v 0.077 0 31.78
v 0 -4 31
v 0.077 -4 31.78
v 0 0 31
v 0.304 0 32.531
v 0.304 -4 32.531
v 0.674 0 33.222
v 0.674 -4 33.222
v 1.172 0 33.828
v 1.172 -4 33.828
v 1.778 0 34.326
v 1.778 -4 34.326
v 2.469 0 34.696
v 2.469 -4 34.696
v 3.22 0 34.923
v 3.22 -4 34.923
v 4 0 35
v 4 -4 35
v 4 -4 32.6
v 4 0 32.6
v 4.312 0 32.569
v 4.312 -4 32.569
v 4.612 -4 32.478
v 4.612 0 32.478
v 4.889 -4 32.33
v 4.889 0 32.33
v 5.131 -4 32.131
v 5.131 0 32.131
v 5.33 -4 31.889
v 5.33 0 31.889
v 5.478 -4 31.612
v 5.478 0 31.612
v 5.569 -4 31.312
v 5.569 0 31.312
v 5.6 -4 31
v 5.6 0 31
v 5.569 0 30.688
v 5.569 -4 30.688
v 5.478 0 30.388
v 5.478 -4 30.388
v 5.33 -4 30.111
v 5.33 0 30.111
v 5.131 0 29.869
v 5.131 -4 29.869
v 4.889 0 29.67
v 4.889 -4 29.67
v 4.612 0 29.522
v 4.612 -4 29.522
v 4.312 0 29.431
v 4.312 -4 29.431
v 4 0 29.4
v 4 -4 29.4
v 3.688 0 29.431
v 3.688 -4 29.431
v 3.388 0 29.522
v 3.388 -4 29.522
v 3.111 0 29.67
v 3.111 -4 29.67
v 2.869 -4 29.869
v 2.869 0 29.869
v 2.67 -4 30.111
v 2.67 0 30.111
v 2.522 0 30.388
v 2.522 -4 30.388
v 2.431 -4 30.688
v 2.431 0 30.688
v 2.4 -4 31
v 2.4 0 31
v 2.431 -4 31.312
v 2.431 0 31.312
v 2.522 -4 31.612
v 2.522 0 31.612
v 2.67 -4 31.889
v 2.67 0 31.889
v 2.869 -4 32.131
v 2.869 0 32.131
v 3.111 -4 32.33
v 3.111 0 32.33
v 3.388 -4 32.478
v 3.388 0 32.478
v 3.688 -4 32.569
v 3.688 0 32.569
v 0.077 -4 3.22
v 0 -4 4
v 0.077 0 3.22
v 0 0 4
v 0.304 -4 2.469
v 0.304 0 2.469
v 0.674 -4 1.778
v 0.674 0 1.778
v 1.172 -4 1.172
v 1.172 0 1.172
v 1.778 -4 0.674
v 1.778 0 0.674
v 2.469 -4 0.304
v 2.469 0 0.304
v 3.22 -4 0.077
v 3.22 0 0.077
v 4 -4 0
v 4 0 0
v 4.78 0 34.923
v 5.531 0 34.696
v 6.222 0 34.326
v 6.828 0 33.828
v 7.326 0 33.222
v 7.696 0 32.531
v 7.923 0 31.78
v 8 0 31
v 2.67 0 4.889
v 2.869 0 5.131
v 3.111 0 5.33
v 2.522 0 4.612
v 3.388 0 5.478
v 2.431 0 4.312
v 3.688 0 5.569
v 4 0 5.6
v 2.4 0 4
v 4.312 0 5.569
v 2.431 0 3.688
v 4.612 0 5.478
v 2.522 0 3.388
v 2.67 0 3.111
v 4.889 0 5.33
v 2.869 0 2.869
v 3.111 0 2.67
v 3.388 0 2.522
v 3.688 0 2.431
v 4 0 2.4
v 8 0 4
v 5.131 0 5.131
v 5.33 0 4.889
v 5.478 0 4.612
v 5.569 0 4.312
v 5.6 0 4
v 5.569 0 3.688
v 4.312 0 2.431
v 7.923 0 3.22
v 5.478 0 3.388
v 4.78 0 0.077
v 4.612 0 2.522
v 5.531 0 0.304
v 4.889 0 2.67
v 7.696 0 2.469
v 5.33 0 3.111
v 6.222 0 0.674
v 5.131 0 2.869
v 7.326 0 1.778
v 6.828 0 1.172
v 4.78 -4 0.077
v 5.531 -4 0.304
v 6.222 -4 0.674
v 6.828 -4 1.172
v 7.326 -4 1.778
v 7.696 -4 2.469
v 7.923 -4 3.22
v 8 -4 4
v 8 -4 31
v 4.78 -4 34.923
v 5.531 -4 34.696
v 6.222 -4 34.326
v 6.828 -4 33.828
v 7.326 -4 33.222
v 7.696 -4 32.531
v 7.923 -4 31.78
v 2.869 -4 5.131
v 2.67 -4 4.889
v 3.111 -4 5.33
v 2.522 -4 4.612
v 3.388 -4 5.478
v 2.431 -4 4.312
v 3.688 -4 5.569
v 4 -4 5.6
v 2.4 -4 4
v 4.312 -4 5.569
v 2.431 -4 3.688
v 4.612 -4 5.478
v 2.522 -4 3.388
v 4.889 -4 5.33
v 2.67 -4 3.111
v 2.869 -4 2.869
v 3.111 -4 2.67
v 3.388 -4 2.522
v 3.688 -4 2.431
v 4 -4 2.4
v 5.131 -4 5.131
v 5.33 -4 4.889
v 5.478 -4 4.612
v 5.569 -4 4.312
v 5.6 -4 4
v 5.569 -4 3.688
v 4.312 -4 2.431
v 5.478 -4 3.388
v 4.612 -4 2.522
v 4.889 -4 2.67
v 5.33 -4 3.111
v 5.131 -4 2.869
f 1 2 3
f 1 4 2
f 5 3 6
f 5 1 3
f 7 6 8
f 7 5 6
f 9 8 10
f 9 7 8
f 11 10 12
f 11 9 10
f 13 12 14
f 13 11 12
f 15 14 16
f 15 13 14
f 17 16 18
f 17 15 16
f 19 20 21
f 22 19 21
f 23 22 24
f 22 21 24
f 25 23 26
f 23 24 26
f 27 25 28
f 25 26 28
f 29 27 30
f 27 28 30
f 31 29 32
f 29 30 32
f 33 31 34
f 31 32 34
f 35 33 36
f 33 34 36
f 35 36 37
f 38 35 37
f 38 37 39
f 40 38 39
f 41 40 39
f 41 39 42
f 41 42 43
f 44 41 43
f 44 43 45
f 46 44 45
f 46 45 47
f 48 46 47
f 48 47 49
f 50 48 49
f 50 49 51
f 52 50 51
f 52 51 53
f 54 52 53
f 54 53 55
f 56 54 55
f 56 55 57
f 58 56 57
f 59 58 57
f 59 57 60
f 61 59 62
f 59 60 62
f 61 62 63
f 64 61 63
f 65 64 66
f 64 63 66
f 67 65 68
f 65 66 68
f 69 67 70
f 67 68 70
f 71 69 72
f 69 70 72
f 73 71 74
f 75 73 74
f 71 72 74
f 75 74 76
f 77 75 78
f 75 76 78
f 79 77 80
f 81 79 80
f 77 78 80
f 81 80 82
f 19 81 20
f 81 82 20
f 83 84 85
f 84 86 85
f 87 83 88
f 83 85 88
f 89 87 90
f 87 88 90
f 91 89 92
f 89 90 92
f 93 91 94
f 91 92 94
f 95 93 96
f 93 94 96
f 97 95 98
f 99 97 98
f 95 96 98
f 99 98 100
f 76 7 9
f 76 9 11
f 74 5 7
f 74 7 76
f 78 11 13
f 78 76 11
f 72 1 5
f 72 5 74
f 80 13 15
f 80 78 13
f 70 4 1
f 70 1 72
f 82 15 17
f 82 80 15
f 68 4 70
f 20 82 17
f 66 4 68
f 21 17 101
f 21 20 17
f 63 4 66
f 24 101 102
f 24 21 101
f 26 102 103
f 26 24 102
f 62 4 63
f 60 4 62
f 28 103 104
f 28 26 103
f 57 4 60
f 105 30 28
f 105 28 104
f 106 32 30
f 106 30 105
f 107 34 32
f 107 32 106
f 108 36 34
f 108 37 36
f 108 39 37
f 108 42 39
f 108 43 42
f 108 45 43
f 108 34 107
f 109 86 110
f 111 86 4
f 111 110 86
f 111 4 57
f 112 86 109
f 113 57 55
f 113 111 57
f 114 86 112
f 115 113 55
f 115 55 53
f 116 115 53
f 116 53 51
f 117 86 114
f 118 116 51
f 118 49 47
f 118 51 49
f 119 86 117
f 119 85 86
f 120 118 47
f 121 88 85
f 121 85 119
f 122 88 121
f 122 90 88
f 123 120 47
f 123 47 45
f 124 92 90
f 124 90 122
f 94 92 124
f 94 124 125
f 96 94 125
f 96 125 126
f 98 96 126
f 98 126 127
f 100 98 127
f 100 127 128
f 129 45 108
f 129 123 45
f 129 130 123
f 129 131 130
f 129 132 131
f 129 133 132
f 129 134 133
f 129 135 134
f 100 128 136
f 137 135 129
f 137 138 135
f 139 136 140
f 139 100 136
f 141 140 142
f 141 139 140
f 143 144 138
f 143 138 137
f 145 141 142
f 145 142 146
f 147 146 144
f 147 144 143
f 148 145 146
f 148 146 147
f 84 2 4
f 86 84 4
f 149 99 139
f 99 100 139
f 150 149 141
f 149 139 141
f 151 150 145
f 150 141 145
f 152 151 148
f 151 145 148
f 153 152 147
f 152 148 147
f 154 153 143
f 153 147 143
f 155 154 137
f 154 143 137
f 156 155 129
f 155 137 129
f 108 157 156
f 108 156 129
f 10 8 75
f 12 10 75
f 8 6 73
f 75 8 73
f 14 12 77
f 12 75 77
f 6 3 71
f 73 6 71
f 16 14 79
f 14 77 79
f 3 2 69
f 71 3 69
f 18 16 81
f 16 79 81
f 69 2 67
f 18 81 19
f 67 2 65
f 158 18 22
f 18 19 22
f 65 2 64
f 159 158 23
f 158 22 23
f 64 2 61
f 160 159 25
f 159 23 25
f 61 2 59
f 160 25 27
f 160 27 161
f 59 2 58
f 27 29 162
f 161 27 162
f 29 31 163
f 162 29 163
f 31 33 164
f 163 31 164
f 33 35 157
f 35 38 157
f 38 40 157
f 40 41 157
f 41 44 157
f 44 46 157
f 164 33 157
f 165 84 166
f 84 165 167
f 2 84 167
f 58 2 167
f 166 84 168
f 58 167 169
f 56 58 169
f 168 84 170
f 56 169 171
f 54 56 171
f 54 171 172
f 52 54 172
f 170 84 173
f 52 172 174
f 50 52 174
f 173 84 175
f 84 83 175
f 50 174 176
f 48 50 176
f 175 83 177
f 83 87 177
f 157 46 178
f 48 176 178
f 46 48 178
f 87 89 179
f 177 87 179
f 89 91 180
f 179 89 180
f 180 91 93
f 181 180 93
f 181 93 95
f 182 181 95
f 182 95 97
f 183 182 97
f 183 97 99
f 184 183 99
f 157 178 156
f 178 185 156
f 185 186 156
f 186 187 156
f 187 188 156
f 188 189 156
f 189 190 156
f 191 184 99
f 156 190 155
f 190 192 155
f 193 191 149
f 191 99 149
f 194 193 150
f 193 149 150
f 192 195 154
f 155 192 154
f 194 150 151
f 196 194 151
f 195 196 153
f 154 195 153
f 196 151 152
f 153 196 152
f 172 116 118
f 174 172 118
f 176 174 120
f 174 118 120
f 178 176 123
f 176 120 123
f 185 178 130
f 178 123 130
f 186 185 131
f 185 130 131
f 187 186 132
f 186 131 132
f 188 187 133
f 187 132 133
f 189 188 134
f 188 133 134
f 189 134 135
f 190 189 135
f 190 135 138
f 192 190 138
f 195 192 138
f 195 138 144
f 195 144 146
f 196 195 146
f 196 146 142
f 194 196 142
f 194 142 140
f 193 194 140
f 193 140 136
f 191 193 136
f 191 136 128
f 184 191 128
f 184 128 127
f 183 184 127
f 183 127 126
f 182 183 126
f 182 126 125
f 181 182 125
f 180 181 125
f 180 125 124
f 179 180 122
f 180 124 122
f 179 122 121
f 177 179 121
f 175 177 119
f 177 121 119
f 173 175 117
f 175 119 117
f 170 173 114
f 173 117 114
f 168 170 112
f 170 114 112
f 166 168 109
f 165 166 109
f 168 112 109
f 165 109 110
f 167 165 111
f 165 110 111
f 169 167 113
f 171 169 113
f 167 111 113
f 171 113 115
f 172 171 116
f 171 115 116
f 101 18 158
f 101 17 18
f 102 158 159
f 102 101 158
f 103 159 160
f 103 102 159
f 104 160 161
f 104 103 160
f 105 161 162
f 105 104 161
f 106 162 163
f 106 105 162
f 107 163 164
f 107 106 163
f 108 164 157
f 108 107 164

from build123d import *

# Parameters (mm, degrees)
SKETCH1_W           = 8
SKETCH1_H           = 4
BOSS_EXTRUDE1_DEPTH = 35
SKETCH2_R           = 1.6
CUT_EXTRUDE1_DEPTH  = 37.124783736
FILLET1_R           = 4


with BuildPart() as part:
    # Sketch1 → Boss-Extrude1 (new body)
    with BuildSketch(Plane.XY):
        with Locations((4, -2)):
            Rectangle(SKETCH1_W, SKETCH1_H)
    extrude(amount=BOSS_EXTRUDE1_DEPTH)

    # Sketch2 → Cut-Extrude1 (cut, through all)
    with BuildSketch(Plane(origin=(0, 0, 0), x_dir=(1, 0, 0), z_dir=(0, 1, 0))):
        with Locations(Location((4, -4, 0), (0, 0, 270))):
            Circle(SKETCH2_R)
        with Locations(Location((4, -31, 0), (0, 0, 270))):
            Circle(SKETCH2_R)
    extrude(amount=-CUT_EXTRUDE1_DEPTH, mode=Mode.SUBTRACT)

    # Fillet1
    fillet1_edges = [part.edges().sort_by_distance(p)[0] for p in [
        (0, -2, 0),
        (8, -2, 0),
        (0, -2, 35),
        (8, -2, 35),
    ]]
    fillet(fillet1_edges, radius=FILLET1_R - 0.0001)  # a hair under: the kernel refuses the full size


solid = part.part
